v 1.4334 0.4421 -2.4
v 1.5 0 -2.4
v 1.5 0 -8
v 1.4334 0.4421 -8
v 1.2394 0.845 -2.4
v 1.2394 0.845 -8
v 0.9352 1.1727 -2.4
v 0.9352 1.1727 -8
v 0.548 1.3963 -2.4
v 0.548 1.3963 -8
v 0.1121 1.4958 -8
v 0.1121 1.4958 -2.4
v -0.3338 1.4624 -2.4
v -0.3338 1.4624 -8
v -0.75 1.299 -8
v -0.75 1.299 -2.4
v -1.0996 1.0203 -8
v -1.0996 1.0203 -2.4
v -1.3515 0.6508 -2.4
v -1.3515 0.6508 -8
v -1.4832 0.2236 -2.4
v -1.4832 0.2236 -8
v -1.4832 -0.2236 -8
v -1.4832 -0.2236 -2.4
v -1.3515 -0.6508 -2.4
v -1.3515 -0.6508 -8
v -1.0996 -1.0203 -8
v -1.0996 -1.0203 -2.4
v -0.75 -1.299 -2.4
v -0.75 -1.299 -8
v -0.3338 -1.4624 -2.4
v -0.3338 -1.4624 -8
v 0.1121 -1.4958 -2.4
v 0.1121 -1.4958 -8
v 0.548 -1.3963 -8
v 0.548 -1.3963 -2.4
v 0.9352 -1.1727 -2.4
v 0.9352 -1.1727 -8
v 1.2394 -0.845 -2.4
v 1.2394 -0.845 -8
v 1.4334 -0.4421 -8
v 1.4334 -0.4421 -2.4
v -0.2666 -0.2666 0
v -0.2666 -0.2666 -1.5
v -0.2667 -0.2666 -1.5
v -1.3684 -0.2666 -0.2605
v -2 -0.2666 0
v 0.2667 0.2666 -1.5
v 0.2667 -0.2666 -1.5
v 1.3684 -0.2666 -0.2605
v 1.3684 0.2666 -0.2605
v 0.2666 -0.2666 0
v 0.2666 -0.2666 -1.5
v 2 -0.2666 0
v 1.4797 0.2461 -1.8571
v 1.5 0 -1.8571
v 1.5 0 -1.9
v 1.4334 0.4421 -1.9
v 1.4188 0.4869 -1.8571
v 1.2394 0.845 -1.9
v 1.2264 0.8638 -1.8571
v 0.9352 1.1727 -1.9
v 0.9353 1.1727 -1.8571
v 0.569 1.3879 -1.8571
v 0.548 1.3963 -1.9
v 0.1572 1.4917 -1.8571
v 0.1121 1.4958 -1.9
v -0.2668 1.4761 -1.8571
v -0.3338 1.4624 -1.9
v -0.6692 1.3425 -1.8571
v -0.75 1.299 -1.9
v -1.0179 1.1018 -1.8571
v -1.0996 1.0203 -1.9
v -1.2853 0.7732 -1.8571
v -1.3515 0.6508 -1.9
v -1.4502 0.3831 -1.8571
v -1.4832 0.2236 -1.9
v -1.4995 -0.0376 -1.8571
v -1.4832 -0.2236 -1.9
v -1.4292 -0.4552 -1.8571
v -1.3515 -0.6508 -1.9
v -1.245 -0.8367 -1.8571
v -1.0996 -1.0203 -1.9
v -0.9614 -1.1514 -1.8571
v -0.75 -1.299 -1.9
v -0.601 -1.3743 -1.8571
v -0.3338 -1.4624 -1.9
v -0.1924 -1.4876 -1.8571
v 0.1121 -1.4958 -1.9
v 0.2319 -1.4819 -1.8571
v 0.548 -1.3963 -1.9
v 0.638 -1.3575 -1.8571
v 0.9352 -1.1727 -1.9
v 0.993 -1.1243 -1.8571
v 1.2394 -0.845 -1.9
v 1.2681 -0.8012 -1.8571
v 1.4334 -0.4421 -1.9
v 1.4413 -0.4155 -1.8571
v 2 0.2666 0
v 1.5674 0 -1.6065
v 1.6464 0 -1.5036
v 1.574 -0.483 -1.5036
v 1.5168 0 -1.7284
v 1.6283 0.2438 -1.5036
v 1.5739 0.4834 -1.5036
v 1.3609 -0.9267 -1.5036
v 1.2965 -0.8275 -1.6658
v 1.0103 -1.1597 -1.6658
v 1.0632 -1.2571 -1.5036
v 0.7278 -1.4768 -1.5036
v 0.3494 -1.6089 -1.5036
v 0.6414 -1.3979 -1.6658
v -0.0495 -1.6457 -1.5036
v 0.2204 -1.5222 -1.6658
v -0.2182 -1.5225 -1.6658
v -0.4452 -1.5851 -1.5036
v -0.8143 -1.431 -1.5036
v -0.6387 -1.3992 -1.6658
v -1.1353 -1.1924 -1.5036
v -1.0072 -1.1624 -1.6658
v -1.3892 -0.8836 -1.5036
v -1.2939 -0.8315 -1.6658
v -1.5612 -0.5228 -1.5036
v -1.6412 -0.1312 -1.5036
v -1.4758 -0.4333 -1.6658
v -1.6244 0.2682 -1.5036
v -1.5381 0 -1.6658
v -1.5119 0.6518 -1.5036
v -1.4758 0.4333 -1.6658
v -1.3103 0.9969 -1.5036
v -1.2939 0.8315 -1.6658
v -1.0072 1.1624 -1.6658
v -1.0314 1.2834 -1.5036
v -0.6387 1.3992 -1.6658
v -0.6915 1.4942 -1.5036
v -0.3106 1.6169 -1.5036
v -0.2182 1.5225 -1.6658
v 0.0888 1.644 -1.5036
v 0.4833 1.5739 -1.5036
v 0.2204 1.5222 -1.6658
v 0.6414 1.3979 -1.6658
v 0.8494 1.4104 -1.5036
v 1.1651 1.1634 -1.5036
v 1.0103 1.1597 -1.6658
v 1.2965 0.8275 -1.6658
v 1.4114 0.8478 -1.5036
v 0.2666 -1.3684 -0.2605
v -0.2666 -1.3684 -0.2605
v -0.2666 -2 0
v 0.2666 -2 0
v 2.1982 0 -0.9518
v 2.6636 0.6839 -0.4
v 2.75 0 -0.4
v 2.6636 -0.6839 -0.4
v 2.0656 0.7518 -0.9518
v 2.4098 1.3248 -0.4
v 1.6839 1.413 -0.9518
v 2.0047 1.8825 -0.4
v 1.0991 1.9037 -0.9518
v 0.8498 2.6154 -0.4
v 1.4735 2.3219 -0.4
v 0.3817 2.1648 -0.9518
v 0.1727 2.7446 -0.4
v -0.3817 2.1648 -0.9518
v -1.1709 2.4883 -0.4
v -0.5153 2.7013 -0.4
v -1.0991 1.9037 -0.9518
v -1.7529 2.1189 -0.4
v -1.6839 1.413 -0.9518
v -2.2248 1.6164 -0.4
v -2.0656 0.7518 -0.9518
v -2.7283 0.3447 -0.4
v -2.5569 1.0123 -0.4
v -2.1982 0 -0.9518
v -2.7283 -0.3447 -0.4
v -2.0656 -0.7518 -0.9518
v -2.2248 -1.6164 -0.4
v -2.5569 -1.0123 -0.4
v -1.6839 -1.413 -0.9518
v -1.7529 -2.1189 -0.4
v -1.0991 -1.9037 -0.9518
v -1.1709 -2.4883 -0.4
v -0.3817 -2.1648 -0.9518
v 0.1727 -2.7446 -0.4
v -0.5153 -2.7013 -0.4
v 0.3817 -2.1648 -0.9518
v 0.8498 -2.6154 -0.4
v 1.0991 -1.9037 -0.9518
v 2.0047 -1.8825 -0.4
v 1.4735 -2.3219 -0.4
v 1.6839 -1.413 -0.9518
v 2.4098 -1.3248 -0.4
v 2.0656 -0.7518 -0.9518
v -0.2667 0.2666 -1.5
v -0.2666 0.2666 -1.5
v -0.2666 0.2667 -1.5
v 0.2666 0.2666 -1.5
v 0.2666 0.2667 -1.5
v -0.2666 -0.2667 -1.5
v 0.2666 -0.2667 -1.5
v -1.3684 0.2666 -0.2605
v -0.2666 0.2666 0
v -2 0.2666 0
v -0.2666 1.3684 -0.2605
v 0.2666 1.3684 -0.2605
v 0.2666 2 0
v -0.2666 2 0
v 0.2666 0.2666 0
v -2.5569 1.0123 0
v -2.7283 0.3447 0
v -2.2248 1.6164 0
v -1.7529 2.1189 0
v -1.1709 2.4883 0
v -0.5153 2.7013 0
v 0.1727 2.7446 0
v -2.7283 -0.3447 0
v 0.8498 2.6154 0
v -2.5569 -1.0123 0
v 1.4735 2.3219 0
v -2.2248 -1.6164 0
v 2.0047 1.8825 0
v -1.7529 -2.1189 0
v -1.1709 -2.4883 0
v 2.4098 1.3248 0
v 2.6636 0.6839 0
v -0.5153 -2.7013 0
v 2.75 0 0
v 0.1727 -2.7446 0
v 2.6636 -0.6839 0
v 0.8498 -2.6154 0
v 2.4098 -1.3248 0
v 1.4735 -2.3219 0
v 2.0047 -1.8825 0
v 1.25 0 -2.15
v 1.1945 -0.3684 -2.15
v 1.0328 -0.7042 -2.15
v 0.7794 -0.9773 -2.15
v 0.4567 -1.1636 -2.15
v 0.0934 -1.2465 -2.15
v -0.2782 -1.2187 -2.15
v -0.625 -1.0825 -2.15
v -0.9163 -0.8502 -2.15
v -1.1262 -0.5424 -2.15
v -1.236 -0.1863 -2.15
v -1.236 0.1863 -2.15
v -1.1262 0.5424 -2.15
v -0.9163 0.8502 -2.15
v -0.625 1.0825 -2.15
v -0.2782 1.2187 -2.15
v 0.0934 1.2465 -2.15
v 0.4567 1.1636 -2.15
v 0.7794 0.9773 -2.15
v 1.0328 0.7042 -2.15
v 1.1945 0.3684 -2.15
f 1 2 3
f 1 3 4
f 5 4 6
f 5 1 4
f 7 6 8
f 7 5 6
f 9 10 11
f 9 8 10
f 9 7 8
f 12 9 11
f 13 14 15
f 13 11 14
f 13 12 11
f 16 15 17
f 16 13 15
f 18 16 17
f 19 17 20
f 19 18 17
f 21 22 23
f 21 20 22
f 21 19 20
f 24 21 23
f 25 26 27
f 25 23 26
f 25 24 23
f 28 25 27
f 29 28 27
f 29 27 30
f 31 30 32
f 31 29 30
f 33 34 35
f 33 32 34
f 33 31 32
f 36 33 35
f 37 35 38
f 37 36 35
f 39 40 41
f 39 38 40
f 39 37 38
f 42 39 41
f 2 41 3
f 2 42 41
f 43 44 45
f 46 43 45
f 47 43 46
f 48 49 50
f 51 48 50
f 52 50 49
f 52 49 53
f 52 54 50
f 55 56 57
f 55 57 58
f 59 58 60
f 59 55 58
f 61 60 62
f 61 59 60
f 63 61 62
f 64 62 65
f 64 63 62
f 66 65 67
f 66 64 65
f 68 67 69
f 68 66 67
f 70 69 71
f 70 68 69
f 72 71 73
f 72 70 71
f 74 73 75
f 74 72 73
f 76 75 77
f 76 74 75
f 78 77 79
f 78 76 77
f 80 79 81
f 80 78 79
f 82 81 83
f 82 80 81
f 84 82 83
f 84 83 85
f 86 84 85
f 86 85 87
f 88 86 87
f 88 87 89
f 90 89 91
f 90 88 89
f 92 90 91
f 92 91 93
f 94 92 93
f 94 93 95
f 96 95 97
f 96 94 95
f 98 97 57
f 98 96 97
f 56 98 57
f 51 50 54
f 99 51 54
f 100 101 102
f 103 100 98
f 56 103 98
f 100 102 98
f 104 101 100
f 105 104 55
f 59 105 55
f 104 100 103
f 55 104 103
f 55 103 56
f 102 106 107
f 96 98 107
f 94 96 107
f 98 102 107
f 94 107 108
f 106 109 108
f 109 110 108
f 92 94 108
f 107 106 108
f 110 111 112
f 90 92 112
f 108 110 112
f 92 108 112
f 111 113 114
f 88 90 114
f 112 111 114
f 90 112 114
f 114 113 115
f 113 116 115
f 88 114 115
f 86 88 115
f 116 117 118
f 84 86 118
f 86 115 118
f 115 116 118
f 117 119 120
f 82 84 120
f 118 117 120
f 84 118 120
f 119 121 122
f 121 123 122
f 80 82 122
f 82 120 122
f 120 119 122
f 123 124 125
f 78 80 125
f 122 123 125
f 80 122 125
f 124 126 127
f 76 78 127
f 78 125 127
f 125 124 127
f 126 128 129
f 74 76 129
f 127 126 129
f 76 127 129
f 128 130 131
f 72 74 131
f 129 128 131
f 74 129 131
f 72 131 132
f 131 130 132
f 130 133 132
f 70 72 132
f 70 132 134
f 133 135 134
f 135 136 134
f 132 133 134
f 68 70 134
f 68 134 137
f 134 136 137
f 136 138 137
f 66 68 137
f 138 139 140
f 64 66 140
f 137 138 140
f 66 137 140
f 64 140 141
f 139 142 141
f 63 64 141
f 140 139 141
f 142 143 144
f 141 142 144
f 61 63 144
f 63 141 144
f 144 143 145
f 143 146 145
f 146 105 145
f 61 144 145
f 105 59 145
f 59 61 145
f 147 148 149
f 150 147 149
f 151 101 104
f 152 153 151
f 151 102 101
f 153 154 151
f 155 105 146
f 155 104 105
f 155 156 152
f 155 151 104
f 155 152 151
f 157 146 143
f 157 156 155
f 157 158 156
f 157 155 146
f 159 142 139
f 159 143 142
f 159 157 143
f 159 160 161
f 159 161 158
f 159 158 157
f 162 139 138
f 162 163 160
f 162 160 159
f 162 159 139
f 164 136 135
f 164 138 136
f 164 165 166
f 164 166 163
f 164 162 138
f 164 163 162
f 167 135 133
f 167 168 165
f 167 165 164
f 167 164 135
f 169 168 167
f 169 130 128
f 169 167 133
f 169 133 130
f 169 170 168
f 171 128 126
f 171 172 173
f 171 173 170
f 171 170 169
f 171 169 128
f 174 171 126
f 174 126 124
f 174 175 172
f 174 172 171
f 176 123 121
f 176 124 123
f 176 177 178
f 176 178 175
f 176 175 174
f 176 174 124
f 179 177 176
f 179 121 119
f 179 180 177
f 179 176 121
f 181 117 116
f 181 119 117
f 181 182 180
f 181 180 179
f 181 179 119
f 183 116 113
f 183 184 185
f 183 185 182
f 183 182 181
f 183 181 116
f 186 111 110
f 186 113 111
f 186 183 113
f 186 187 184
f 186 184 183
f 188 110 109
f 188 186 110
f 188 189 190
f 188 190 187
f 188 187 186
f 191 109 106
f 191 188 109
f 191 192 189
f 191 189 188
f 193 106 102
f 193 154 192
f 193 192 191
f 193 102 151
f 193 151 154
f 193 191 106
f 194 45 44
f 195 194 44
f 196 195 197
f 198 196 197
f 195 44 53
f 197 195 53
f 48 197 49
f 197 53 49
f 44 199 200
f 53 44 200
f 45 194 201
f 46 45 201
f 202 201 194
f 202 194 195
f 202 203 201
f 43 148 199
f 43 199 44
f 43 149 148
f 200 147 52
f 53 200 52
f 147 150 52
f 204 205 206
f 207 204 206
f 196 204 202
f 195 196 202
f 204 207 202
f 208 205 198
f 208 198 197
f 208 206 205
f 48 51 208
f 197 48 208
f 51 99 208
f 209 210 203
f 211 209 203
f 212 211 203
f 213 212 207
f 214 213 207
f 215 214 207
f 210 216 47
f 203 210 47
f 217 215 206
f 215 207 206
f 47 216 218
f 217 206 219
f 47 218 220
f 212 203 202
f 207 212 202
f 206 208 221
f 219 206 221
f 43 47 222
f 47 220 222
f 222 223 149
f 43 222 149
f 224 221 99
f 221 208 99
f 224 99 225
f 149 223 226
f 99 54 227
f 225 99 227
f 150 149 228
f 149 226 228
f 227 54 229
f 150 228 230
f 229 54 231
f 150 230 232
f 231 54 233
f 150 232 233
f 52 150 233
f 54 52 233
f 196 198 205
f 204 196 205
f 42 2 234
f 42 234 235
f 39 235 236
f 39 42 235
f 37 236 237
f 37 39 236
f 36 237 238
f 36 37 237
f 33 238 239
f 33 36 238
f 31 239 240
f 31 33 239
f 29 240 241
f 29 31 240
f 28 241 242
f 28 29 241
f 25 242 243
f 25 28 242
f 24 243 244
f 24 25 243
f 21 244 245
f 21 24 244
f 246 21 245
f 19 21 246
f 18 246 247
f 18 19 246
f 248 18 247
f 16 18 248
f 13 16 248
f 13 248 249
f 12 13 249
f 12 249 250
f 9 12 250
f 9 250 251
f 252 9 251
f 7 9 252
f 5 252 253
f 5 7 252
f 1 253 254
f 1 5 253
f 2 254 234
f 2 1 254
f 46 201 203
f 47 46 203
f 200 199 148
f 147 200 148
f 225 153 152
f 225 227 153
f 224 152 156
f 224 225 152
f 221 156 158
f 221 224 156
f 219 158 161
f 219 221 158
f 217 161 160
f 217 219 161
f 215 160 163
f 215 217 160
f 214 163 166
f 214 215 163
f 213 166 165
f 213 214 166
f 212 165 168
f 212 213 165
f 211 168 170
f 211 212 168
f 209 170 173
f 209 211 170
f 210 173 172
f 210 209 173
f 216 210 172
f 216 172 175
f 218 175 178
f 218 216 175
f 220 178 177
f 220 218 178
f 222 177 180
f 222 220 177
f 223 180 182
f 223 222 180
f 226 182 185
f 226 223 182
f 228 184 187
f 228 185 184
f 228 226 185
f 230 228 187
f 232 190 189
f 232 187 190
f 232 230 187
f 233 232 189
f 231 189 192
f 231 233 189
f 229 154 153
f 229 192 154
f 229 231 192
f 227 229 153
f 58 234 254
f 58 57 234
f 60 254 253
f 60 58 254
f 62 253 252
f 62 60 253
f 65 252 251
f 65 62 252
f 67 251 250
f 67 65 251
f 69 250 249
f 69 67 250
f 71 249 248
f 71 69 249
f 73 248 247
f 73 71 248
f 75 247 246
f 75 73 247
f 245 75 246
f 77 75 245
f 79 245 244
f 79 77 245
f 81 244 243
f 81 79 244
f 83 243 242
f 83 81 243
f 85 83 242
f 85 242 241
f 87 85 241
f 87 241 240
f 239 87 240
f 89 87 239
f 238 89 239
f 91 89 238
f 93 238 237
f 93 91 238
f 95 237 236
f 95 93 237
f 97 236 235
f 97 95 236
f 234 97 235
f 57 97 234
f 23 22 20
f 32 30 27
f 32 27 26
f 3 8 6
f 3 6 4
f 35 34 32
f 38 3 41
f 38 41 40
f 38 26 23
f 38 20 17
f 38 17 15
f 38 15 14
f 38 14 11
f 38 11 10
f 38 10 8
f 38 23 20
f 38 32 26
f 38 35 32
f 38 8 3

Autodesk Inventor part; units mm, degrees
ref_plane "YZ Plane" through (0, 0, 0) normal (1, 0, 0) x (0, 1, 0)
sketch "Esquisse1" plane through (0, 0, 0) normal (0, 1, 0) x (-1, 0, 0)
  point P0 (0, 0)
sketch "Esquisse2" plane through (0, 0, 0) normal (0, 0, 1) x (1, 0, 0)
  point P0 (0, 0)
sketch "Esquisse3" plane through (0, 0, 0) normal (0, 0, 1) x (1, 0, 0)
  point P0 (0, 0)
sketch "Esquisse4" plane through (0, 0, 0) normal (0, 1, 0) x (-1, 0, 0)
  line L0 (-2.75, 0) -> (0, 0)
  line L1 (-2.75, -0.4) -> (-2.75, 0)
  line L2 (-1.5, -1.65) -> (-2.75, -0.4)
  line L3 (-1.5, -1.9) -> (-1.5, -1.65)
  line L4 (-1.25, -2.15) -> (-1.5, -1.9)
  line L5 (-1.5, -2.4) -> (-1.25, -2.15)
  line L6 (-1.5, -8) -> (-1.5, -2.4)
  line L7 (0, 0) -> (0, -8)
  line L8 (0, 3.3392) -> (0, -10.7) construction
  line L9 (0, 3.3392) -> (0, -10.7)
  line L10 (0, -13.5078) -> (0, 6.1471) projected
  line L11 (-1.5, -8) -> (0, -8)
  line L12 (0.55, 0) -> (-3.3, 0) projected
  dimension "d3" = 2.75
  dimension "d5" = 0.25
  dimension "d7" = 0.25
  dimension "d9" = 0.25
  dimension "d11" = 1.65
  dimension "d13" = 135
  dimension "d17" = 1.25
  dimension "d19" = 0
  dimension "d51" = 1.5
  dimension "d52" = 8
revolve "Révolution1" add sketch "Esquisse4" angle 360 about axis through (0, 0, 3.3392) along (0, 0, -1)
sketch "Esquisse5" plane through (0, 0, 0) normal (0, 1, 0) x (-1, 0, 0)
  line L0 (-1.6, 0) -> (0, 0)
  line L1 (-0.2667, -1.5) -> (-1.6, 0)
  line L2 (0, -1.5) -> (-0.2667, -1.5)
  line L3 (0, 0) -> (0, -1.5)
  line L4 (-1.5, -1.65) -> (1.5, -1.65) construction
  line L5 (-2.75, 0) -> (2.75, 0) projected
  line L6 (0, -1.98) -> (0, 0.33) projected
  dimension "d22" = 1.6
  dimension "d24" = 0.2667
  dimension "d26" = 1.5
extrude "Extrusion1" cut sketch "Esquisse5" along normal mid plane 0.5333
pattern_circular "RéseauPolaire1" count 4 over 360 about axis through (0, 0, 0) along (0, 0, 1) of "Extrusion1"
sketch "Esquisse7" plane through (0, 0, 0) normal (0, 1, 0) x (-1, 0, 0)
  line L0 (0, -0.825) -> (-2, 0)
  line L1 (0, 0) -> (0, -0.825)
  line L2 (-2, 0) -> (0, 0)
  line L3 (-1.5, -1.65) -> (1.5, -1.65) construction
  line L4 (0, -1.98) -> (0, 0.33) projected
  line L5 (-2.75, 0) -> (2.75, 0) projected
  dimension "d33" = 2
  dimension "d35" = 0.825
extrude "Extrusion2" cut sketch "Esquisse7" along normal mid plane 0.5333
pattern_circular "RéseauPolaire2" count 4 over 360 about axis through (0, 0, 0) along (0, 0, 1) of "Extrusion2"
fillet "Congé1" radius 0.5 1 edges at (-1.5, 0, -1.65)
thread "Filetage1" size "M3x0.5" class "6g" standard "ISO Metric profile" full length
ref_plane "MSC_PF1" through (0, 0, 0) normal (1, 0, 0) x (0, 1, 0)
ref_plane "MSC_PT1" through (0, 0, 0) normal (0, 0, -1) x (-1, 0, 0)
equation "\"d3\" = 0.5 * Dh"
equation "\"d5\" = msp_x"
equation "\"d7\" = ParA"
equation "\"d9\" = msp_x"
equation "\"d11\" = ParK"
equation "\"d17\" = 0.5 * msp_mdtds"
equation "\"d51\" = 0.5 * NND"
equation "\"d52\" = NLG"
equation "\"d22\" = 0.5 * M"
equation "\"d24\" = 0.0833333 * M"
equation "\"d26\" = 0.909091 * ParK"
equation "\"d27\" = 0.166667 * M"
equation "\"d33\" = 0.625 * M"
equation "\"d35\" = 0.5 * ParK"
equation "\"d36\" = 0.166667 * M"
equation "\"d41\" = 2 * msp_x"
equation "\"PTC\" = 0.5"
equation "\"NLG\" = 8"
equation "\"ParK\" = 1.65"
equation "\"NND\" = 3"
equation "\"M\" = 3.2"
equation "\"msp_mdtds\" = NND - PTC"
equation "\"Dh\" = 5.5"
equation "\"msp_x\" = 0.5 * PTC"
equation "\"ParA\" = 0.5 * PTC"
equation "\"r\" = 0.8"
equation "\"THREADDIA\" = NND"
equation "\"TEMPLATE\" = 1.2345"
properties part number "NF EN ISO 7046-2 H - M3x8 - 8.8 - H1" material "Acier inoxydable 440C"
